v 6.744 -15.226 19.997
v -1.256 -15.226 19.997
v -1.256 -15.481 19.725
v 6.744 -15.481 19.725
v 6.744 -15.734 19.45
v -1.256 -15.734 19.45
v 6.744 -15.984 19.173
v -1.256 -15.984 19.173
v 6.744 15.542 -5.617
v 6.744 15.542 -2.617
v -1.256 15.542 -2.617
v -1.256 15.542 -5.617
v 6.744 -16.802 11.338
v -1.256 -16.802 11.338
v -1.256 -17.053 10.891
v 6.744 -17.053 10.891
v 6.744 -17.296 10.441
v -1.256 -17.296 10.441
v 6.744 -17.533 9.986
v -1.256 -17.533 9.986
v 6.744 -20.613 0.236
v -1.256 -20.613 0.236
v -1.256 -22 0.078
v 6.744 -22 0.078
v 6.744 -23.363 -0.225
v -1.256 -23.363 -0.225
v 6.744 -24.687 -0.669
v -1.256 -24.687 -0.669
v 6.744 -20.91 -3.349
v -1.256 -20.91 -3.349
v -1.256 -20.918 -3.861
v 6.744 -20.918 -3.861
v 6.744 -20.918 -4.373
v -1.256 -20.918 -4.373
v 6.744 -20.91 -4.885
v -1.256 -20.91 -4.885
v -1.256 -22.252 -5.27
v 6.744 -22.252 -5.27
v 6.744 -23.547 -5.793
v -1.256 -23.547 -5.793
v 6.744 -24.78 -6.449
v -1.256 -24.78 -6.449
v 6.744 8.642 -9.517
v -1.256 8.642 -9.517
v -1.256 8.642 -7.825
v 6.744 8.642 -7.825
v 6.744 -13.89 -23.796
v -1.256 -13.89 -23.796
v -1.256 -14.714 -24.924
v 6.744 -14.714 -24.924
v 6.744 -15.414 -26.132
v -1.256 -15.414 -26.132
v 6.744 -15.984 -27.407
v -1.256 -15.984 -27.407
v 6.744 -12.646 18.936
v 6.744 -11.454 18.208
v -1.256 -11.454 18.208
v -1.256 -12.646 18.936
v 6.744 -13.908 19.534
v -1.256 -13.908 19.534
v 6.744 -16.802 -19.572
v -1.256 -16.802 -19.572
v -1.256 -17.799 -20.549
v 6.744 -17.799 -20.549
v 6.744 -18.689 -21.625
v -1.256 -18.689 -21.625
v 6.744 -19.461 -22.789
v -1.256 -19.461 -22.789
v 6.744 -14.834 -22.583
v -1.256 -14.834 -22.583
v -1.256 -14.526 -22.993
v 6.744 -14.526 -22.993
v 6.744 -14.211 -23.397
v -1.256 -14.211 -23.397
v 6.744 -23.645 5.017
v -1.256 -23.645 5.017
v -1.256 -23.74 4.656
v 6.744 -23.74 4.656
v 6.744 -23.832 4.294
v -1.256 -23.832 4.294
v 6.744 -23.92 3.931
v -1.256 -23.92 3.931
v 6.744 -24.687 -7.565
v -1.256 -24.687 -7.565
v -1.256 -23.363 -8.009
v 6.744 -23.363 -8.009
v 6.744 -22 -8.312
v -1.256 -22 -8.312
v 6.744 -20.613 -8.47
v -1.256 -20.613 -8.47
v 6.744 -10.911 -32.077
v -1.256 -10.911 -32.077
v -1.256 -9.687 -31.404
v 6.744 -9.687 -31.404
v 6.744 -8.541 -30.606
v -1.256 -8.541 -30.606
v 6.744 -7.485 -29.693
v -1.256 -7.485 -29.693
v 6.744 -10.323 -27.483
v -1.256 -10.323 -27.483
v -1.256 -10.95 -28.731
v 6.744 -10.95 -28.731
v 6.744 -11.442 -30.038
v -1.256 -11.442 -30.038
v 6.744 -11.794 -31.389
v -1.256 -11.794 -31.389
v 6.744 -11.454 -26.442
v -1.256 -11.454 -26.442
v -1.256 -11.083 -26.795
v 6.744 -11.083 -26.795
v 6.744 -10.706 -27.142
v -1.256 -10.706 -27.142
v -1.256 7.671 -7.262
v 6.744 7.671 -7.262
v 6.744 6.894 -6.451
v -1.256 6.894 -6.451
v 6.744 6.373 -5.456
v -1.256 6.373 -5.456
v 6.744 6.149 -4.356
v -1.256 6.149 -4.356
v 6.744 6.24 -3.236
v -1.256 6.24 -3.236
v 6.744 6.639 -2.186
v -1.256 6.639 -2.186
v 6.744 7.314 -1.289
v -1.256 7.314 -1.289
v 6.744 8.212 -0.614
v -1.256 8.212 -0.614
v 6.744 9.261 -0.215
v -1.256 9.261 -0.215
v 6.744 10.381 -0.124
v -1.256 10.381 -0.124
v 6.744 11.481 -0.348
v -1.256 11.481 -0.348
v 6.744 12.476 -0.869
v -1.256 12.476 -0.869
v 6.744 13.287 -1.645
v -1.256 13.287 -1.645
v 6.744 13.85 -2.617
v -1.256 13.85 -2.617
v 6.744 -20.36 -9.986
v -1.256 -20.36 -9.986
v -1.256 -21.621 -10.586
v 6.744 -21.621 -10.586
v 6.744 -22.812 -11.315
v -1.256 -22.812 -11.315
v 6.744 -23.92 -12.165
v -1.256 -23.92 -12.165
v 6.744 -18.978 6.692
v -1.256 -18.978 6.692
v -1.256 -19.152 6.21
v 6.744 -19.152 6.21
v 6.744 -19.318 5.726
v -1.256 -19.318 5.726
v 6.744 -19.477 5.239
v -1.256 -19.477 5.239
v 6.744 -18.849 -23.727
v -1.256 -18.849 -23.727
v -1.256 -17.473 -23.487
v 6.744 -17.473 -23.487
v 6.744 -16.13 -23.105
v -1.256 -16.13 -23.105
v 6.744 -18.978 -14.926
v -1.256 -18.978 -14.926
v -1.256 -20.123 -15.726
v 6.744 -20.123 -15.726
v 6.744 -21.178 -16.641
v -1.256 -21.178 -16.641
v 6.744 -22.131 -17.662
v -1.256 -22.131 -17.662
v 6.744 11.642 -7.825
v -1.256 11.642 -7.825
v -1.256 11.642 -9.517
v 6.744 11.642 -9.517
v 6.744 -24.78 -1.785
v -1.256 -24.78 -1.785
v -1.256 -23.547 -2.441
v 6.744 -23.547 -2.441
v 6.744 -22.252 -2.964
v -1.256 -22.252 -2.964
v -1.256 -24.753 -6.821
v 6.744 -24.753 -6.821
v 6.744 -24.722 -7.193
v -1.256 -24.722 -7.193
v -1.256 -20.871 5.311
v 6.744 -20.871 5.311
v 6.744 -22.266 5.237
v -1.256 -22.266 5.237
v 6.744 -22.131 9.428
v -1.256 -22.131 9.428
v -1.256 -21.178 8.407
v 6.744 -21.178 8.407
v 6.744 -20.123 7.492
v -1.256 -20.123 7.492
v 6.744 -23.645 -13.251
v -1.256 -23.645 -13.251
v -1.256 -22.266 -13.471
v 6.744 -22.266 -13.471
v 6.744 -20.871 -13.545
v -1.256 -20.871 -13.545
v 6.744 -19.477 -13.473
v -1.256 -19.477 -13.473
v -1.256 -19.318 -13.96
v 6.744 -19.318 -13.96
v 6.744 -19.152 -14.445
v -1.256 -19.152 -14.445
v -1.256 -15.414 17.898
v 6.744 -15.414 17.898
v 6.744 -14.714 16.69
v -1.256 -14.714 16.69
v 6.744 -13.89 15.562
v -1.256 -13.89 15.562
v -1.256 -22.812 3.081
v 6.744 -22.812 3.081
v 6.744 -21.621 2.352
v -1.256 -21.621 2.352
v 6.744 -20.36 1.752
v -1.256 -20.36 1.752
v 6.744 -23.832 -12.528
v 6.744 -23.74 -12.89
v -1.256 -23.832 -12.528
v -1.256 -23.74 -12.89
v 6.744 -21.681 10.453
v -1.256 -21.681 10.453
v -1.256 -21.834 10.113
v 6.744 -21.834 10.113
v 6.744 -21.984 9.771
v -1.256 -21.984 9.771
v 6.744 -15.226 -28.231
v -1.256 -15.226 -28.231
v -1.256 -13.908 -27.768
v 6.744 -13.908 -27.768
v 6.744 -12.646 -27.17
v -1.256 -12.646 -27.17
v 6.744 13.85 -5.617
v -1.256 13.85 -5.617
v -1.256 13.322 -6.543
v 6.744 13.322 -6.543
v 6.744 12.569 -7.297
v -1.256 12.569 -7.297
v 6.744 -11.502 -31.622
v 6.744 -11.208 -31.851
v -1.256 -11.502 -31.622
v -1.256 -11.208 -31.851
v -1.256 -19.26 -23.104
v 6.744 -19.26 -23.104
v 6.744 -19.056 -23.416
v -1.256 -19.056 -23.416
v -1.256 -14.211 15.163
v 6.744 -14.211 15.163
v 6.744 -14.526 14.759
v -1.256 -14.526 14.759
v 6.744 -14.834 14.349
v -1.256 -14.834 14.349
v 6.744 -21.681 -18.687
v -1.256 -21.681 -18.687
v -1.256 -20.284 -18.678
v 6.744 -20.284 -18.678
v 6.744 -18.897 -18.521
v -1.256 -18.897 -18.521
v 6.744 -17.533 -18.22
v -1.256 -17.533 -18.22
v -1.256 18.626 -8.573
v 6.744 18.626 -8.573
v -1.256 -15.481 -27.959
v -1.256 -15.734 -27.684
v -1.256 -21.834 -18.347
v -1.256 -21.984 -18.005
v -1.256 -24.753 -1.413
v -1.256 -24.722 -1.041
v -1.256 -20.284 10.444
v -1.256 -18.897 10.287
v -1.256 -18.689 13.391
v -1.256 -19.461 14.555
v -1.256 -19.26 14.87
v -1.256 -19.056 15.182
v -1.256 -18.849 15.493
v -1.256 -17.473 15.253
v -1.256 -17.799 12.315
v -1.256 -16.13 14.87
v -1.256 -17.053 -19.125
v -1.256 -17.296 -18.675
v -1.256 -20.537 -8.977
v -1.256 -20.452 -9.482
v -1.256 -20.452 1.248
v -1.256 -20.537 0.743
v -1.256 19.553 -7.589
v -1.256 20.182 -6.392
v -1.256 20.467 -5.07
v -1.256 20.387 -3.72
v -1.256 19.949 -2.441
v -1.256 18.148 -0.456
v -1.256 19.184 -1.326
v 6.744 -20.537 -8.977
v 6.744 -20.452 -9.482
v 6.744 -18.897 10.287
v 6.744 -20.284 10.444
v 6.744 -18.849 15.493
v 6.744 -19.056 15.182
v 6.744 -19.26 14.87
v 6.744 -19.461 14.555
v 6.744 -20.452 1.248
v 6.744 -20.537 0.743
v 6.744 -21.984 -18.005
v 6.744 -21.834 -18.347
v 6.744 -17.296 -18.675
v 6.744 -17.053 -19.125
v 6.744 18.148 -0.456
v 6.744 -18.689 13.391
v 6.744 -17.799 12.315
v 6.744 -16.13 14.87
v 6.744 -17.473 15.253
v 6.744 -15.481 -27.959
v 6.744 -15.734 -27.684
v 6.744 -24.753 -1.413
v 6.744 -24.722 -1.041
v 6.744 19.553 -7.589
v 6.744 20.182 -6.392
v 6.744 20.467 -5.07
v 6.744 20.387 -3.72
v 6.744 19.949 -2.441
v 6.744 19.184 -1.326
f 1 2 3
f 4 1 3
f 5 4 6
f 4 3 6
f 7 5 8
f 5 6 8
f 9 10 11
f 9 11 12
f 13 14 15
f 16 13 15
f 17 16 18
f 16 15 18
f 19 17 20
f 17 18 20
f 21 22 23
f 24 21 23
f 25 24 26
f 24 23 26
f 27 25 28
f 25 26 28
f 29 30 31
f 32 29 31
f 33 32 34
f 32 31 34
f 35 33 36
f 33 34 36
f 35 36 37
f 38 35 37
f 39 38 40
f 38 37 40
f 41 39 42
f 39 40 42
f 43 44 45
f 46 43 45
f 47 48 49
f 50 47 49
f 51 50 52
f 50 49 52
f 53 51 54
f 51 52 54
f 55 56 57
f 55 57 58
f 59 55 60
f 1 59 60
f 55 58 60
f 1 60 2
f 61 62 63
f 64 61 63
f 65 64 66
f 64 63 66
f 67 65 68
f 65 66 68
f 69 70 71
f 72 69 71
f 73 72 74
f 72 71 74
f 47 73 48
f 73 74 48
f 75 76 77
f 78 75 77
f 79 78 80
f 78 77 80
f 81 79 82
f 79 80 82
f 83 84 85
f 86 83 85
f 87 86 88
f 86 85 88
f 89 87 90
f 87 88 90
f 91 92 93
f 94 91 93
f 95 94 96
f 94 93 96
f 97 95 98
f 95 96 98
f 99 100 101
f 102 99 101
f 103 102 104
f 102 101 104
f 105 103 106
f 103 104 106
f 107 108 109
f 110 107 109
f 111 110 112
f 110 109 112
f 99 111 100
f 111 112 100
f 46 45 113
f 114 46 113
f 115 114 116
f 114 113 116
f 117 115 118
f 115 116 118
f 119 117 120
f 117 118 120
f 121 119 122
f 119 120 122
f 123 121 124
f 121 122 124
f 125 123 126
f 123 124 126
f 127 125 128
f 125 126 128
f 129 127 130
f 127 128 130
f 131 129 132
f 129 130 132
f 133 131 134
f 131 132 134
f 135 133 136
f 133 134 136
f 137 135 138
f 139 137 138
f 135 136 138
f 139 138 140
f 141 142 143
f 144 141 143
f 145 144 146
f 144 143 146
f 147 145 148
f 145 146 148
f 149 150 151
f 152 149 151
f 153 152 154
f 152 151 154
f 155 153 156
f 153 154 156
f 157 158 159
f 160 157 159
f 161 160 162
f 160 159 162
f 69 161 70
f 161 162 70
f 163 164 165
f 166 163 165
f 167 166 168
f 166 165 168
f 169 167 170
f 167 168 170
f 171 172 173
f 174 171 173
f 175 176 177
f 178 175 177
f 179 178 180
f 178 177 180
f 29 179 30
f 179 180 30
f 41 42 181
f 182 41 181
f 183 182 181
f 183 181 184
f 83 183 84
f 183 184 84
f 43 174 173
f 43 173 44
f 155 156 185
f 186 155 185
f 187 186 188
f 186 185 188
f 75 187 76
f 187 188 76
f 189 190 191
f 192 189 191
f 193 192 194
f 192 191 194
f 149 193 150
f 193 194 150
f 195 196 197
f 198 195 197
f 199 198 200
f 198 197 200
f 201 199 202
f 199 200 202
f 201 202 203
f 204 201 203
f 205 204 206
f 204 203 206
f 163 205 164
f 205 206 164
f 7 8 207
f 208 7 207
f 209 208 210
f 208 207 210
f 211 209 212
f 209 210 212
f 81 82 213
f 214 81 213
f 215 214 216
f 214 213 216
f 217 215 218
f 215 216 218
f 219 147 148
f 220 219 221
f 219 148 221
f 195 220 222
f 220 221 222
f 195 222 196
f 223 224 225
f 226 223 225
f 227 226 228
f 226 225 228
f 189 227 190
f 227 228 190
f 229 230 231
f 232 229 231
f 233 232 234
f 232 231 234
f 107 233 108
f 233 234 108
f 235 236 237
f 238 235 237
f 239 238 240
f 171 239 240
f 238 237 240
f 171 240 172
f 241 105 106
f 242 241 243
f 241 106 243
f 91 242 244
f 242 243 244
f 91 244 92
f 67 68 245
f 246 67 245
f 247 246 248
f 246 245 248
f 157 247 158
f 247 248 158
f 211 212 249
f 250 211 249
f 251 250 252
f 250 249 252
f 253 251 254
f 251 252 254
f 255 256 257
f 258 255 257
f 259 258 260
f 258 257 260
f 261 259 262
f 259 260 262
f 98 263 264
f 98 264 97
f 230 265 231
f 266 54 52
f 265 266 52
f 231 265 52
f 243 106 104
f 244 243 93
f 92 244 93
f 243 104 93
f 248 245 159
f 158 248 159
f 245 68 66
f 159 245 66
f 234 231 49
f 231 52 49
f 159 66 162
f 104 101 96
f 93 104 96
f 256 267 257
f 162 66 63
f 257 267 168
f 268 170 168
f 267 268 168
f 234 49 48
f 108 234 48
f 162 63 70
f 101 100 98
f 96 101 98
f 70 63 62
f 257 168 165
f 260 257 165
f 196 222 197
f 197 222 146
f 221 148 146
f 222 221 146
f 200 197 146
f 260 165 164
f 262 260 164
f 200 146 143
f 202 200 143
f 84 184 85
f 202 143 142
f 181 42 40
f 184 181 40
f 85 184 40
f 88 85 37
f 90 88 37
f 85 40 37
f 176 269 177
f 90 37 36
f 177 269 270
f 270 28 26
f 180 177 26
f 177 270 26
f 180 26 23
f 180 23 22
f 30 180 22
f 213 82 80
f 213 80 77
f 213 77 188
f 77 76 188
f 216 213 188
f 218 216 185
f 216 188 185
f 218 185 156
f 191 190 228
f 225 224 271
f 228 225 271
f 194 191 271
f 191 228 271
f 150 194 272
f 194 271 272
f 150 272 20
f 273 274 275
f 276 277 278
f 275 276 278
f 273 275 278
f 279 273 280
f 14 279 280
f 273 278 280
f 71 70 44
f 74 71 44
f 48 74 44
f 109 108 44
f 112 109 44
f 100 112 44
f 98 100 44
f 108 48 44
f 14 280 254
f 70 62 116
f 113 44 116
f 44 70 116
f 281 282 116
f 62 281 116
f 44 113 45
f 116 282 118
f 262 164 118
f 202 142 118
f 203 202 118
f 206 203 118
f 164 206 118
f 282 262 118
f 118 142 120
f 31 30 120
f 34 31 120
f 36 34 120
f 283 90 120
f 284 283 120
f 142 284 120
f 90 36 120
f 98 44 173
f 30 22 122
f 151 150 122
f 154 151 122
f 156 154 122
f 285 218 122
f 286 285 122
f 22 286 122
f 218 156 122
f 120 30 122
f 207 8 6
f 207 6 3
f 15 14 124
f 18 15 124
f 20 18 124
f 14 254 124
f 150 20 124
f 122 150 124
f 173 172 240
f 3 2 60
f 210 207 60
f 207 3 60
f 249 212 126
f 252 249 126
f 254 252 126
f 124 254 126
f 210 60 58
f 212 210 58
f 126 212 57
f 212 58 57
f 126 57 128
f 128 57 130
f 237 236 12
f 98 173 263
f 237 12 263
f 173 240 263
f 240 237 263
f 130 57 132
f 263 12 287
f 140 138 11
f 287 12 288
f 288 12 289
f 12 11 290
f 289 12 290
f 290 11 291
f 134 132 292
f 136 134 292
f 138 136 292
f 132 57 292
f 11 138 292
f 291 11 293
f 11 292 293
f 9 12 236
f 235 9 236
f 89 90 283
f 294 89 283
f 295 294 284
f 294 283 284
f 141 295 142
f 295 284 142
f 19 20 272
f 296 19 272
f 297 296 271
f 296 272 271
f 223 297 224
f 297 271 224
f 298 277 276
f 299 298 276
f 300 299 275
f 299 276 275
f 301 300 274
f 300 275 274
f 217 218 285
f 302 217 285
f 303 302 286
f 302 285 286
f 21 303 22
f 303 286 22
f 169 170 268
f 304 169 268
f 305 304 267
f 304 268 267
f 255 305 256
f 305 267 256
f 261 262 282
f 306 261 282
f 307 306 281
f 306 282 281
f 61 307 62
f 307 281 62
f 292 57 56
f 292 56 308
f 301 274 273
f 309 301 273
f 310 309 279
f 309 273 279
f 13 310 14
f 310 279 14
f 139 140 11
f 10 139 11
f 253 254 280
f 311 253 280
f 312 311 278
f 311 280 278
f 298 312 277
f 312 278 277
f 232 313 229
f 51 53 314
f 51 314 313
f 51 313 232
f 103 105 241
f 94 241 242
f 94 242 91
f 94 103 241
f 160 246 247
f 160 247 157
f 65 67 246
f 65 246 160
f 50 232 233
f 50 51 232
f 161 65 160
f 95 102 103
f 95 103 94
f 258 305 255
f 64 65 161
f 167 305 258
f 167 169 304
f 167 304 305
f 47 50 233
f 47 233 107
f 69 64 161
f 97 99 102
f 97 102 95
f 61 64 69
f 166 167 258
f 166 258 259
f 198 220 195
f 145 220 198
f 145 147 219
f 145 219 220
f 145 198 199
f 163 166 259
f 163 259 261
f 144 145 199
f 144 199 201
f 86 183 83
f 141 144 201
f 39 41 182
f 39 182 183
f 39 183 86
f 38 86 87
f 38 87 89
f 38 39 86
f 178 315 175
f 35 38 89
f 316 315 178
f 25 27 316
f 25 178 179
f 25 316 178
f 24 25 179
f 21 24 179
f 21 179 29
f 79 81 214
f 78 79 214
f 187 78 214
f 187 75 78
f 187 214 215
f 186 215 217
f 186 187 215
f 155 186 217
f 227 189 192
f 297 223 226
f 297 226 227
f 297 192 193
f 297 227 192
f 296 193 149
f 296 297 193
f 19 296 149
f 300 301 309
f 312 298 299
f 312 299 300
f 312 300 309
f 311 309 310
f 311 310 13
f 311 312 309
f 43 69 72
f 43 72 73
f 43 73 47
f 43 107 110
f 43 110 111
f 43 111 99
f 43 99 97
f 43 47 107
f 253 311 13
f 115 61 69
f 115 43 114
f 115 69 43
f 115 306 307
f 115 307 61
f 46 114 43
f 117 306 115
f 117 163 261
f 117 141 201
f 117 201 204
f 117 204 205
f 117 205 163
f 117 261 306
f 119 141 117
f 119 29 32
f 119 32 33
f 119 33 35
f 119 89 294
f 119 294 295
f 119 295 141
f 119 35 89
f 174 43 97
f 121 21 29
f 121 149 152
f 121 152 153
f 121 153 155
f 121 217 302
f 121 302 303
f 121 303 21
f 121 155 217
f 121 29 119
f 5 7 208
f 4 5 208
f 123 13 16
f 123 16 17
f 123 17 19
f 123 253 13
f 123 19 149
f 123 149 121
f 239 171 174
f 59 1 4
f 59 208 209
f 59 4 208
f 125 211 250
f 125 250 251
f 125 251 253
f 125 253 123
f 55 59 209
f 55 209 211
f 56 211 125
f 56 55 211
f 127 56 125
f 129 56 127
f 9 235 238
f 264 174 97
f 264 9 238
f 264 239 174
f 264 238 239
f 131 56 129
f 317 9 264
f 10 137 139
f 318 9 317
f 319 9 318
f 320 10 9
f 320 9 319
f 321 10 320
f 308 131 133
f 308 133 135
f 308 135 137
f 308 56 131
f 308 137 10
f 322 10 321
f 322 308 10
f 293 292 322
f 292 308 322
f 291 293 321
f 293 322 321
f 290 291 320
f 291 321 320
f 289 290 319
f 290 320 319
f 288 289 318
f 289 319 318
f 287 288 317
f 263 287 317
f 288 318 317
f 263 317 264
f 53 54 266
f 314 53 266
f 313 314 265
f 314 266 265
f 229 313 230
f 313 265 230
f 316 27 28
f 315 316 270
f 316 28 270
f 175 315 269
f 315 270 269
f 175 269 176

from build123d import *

# Parameters (mm, degrees)
SPUR_START          = -1.255872891
SPUR_GEAR_ISO_DEPTH = 8
CUT_EXTRUDE1_START  = -8
CUT_EXTRUDE1_DEPTH  = 8
FILLET1_R           = 5


# Read off the part's stored shape, not the designer's step: spur gear_iso
with BuildPart() as part:
    # spur gear_iso outline → spur gear_iso (new body)
    with BuildSketch(Plane.YZ.offset(SPUR_START)):
        with BuildLine():
            ThreePointArc((10.70226618, 30.878475903), (10.142251627, 30.882956422), (9.582237074, 30.878475903))
            ThreePointArc((9.582237074, 30.878475903), (8.805580488, 28.934301135), (8.343630809, 26.892337993))
            ThreePointArc((8.343630809, 26.892337993), (7.577213288, 26.838365652), (6.812365147, 26.765453703))
            ThreePointArc((6.812365147, 26.765453703), (6.020619773, 28.703532711), (4.934555121, 30.493357996))
            ThreePointArc((4.934555121, 30.493357996), (4.381440967, 30.405602041), (3.829801752, 30.309007264))
            ThreePointArc((3.829801752, 30.309007264), (3.383738399, 28.263515034), (3.264185198, 26.17336719))
            ThreePointArc((3.264185198, 26.17336719), (2.517104168, 25.993982783), (1.774688472, 25.796175391))
            ThreePointArc((1.774688472, 25.796175391), (0.674744152, 27.577504522), (-0.691103553, 29.164158557))
            ThreePointArc((-0.691103553, 29.164158557), (-1.222229795, 28.986559882), (-1.750446392, 28.800485701))
            ThreePointArc((-1.750446392, 28.800485701), (-1.853749067, 26.709471704), (-1.62764469, 24.628152942))
            ThreePointArc((-1.62764469, 24.628152942), (-2.335010805, 24.328249608), (-3.034742893, 24.010942444))
            ThreePointArc((-3.034742893, 24.010942444), (-4.412882545, 25.586931683), (-6.021256538, 26.927134682))
            ThreePointArc((-6.021256538, 26.927134682), (-6.515907129, 26.664537715), (-7.006292737, 26.394059749))
            ThreePointArc((-7.006292737, 26.394059749), (-6.764016906, 24.314561396), (-6.198422489, 22.298844666))
            ThreePointArc((-6.198422489, 22.298844666), (-6.846778586, 21.886602987), (-7.484740198, 21.458451363))
            ThreePointArc((-7.484740198, 21.458451363), (-9.103483124, 22.786111831), (-10.910511155, 23.843306549))
            ThreePointArc((-10.910511155, 23.843306549), (-11.355193317, 23.502874251), (-11.794371494, 23.155370434))
            ThreePointArc((-11.794371494, 23.155370434), (-11.21312581, 21.144111019), (-10.323469295, 19.24897982))
            ThreePointArc((-10.323469295, 19.24897982), (-10.89512991, 18.735644674), (-11.453919115, 18.20832745))
            ThreePointArc((-11.453919115, 18.20832745), (-13.269110228, 19.251444031), (-15.225501284, 19.996792953))
            ThreePointArc((-15.225501284, 19.996792953), (-15.608085246, 19.587811429), (-15.984076358, 19.172760759))
            ThreePointArc((-15.984076358, 19.172760759), (-15.079715688, 17.284602196), (-13.890264584, 15.561750766))
            ThreePointArc((-13.890264584, 15.561750766), (-14.369636305, 14.961324598), (-14.834010792, 14.349225613))
            ThreePointArc((-14.834010792, 14.349225613), (-16.796136411, 15.079344806), (-18.848525243, 15.492516756))
            ThreePointArc((-18.848525243, 15.492516756), (-19.158575112, 15.026141957), (-19.461123099, 14.554865934))
            ThreePointArc((-19.461123099, 14.554865934), (-18.258316045, 12.841312267), (-16.801515479, 11.337735501))
            ThreePointArc((-16.801515479, 11.337735501), (-17.175522296, 10.666596371), (-17.532815138, 9.98641209))
            ThreePointArc((-17.532815138, 9.98641209), (-19.58835359, 10.383618147), (-21.680756382, 10.453342871))
            ThreePointArc((-21.680756382, 10.453342871), (-21.909814806, 9.942296285), (-22.130666949, 9.427650091))
            ThreePointArc((-22.130666949, 9.427650091), (-20.662222952, 7.935442597), (-18.977810645, 6.692154151))
            ThreePointArc((-18.977810645, 6.692154151), (-19.236250626, 5.968608985), (-19.476715807, 5.238893062))
            ThreePointArc((-19.476715807, 5.238893062), (-21.569597361, 5.292351237), (-23.644938818, 5.016726826))
            ThreePointArc((-23.644938818, 5.016726826), (-23.786757681, 4.474948472), (-23.919889709, 3.930970313))
            ThreePointArc((-23.919889709, 3.930970313), (-22.225864093, 2.700812522), (-20.359786422, 1.751726064))
            ThreePointArc((-20.359786422, 1.751726064), (-20.495609998, 0.995511288), (-20.612688254, 0.236168472))
            ThreePointArc((-20.612688254, 0.236168472), (-22.685824559, -0.055579435), (-24.687494776, -0.669034665))
            ThreePointArc((-24.687494776, -0.669034665), (-24.738205628, -1.226766486), (-24.779986047, -1.785238304))
            ThreePointArc((-24.779986047, -1.785238304), (-22.906587414, -2.719790893), (-20.909746114, -3.34878676))
            ThreePointArc((-20.909746114, -3.34878676), (-20.919248373, -4.117043577), (-20.909746114, -4.885300395))
            ThreePointArc((-20.909746114, -4.885300395), (-22.906587414, -5.514296262), (-24.779986047, -6.448848851))
            ThreePointArc((-24.779986047, -6.448848851), (-24.738205628, -7.007320669), (-24.687494776, -7.56505249))
            ThreePointArc((-24.687494776, -7.56505249), (-22.685824559, -8.17850772), (-20.612688254, -8.470255627))
            ThreePointArc((-20.612688254, -8.470255627), (-20.495609998, -9.229598443), (-20.359786422, -9.985813219))
            ThreePointArc((-20.359786422, -9.985813219), (-22.225864092, -10.934899678), (-23.919889709, -12.165057468))
            ThreePointArc((-23.919889709, -12.165057468), (-23.786757681, -12.709035628), (-23.644938818, -13.250813982))
            ThreePointArc((-23.644938818, -13.250813982), (-21.569597361, -13.526438392), (-19.476715807, -13.472980218))
            ThreePointArc((-19.476715807, -13.472980218), (-19.236250626, -14.20269614), (-18.977810645, -14.926241306))
            ThreePointArc((-18.977810645, -14.926241306), (-20.662222952, -16.169529752), (-22.130666949, -17.661737246))
            ThreePointArc((-22.130666949, -17.661737246), (-21.909814806, -18.17638344), (-21.680756382, -18.687430026))
            ThreePointArc((-21.680756382, -18.687430026), (-19.58835359, -18.617705303), (-17.532815138, -18.220499246))
            ThreePointArc((-17.532815138, -18.220499246), (-17.175522296, -18.900683526), (-16.801515479, -19.571822656))
            ThreePointArc((-16.801515479, -19.571822656), (-18.258316045, -21.075399422), (-19.461123099, -22.788953089))
            ThreePointArc((-19.461123099, -22.788953089), (-19.158575112, -23.260229112), (-18.848525243, -23.726603911))
            ThreePointArc((-18.848525243, -23.726603911), (-16.79613641, -23.313431962), (-14.834010792, -22.583312768))
            ThreePointArc((-14.834010792, -22.583312768), (-14.369636305, -23.195411753), (-13.890264584, -23.795837921))
            ThreePointArc((-13.890264584, -23.795837921), (-15.079715688, -25.518689351), (-15.984076358, -27.406847914))
            ThreePointArc((-15.984076358, -27.406847914), (-15.608085247, -27.821898584), (-15.225501284, -28.230880108))
            ThreePointArc((-15.225501284, -28.230880108), (-13.269110228, -27.485531187), (-11.453919115, -26.442414605))
            ThreePointArc((-11.453919115, -26.442414605), (-10.89512991, -26.969731829), (-10.323469295, -27.483066975))
            ThreePointArc((-10.323469295, -27.483066975), (-11.21312581, -29.378198174), (-11.794371494, -31.389457589))
            ThreePointArc((-11.794371494, -31.389457589), (-11.355193317, -31.736961407), (-10.910511155, -32.077393705))
            ThreePointArc((-10.910511155, -32.077393705), (-9.103483124, -31.020198987), (-7.484740198, -29.692538518))
            ThreePointArc((-7.484740198, -29.692538518), (-6.846778586, -30.120690142), (-6.198422489, -30.532931821))
            ThreePointArc((-6.198422489, -30.532931821), (-6.764016906, -32.548648551), (-7.006292737, -34.628146904))
            ThreePointArc((-7.006292737, -34.628146904), (-6.515907129, -34.89862487), (-6.021256538, -35.161221837))
            ThreePointArc((-6.021256538, -35.161221837), (-4.412882545, -33.821018838), (-3.034742893, -32.2450296))
            ThreePointArc((-3.034742893, -32.2450296), (-2.335010806, -32.562336764), (-1.62764469, -32.862240097))
            ThreePointArc((-1.62764469, -32.862240097), (-1.853749067, -34.943558859), (-1.750446392, -37.034572856))
            ThreePointArc((-1.750446392, -37.034572856), (-1.222229795, -37.220647037), (-0.691103553, -37.398245713))
            ThreePointArc((-0.691103553, -37.398245713), (0.674744152, -35.811591678), (1.774688472, -34.030262547))
            ThreePointArc((1.774688472, -34.030262547), (2.517104168, -34.228069938), (3.264185198, -34.407454345))
            ThreePointArc((3.264185198, -34.407454345), (3.383738399, -36.49760219), (3.829801752, -38.54309442))
            ThreePointArc((3.829801752, -38.54309442), (4.381440967, -38.639689197), (4.934555121, -38.727445151))
            ThreePointArc((4.934555121, -38.727445151), (6.020619773, -36.937619866), (6.812365147, -34.999540858))
            ThreePointArc((6.812365147, -34.999540858), (7.577213288, -35.072452807), (8.343630809, -35.126425148))
            ThreePointArc((8.343630809, -35.126425148), (8.805580488, -37.16838829), (9.582237074, -39.112563058))
            ThreePointArc((9.582237074, -39.112563058), (10.142251627, -39.117043578), (10.70226618, -39.112563058))
            ThreePointArc((10.70226618, -39.112563058), (11.478922766, -37.16838829), (11.940872445, -35.126425148))
            ThreePointArc((11.940872445, -35.126425148), (12.707289966, -35.072452807), (13.472138107, -34.999540858))
            ThreePointArc((13.472138107, -34.999540858), (14.263883482, -36.937619866), (15.349948133, -38.727445151))
            ThreePointArc((15.349948133, -38.727445151), (15.903062287, -38.639689197), (16.454701502, -38.54309442))
            ThreePointArc((16.454701502, -38.54309442), (16.900764855, -36.49760219), (17.020318056, -34.407454345))
            ThreePointArc((17.020318056, -34.407454345), (17.767399086, -34.228069938), (18.509814783, -34.030262547))
            ThreePointArc((18.509814783, -34.030262547), (19.609759102, -35.811591678), (20.975606807, -37.398245713))
            ThreePointArc((20.975606807, -37.398245713), (21.506733049, -37.220647037), (22.034949647, -37.034572856))
            ThreePointArc((22.034949647, -37.034572856), (22.138252321, -34.943558859), (21.912147944, -32.862240097))
            ThreePointArc((21.912147944, -32.862240097), (22.61951406, -32.562336764), (23.319246148, -32.2450296))
            ThreePointArc((23.319246148, -32.2450296), (24.697385799, -33.821018838), (26.305759792, -35.161221837))
            ThreePointArc((26.305759792, -35.161221837), (26.800410383, -34.89862487), (27.290795991, -34.628146904))
            ThreePointArc((27.290795991, -34.628146904), (27.04852016, -32.548648551), (26.482925743, -30.532931821))
            ThreePointArc((26.482925743, -30.532931821), (27.131281841, -30.120690142), (27.769243452, -29.692538518))
            ThreePointArc((27.769243452, -29.692538518), (29.387986378, -31.020198987), (31.19501441, -32.077393705))
            ThreePointArc((31.19501441, -32.077393705), (31.639696572, -31.736961407), (32.078874749, -31.389457589))
            ThreePointArc((32.078874749, -31.389457589), (31.497629065, -29.378198174), (30.607972549, -27.483066975))
            ThreePointArc((30.607972549, -27.483066975), (31.179633164, -26.969731829), (31.73842237, -26.442414605))
            ThreePointArc((31.73842237, -26.442414605), (33.553613483, -27.485531187), (35.510004539, -28.230880108))
            ThreePointArc((35.510004539, -28.230880108), (35.892588501, -27.821898585), (36.268579612, -27.406847914))
            ThreePointArc((36.268579612, -27.406847914), (35.364218942, -25.518689351), (34.174767838, -23.795837921))
            ThreePointArc((34.174767838, -23.795837921), (34.65413956, -23.195411753), (35.118514046, -22.583312768))
            ThreePointArc((35.118514046, -22.583312768), (37.080639664, -23.313431962), (39.133028497, -23.726603911))
            ThreePointArc((39.133028497, -23.726603911), (39.443078366, -23.260229112), (39.745626354, -22.788953089))
            ThreePointArc((39.745626354, -22.788953089), (38.5428193, -21.075399422), (37.086018733, -19.571822656))
            ThreePointArc((37.086018733, -19.571822656), (37.46002555, -18.900683526), (37.817318393, -18.220499246))
            ThreePointArc((37.817318393, -18.220499246), (39.872856845, -18.617705303), (41.965259636, -18.687430026))
            ThreePointArc((41.965259636, -18.687430026), (42.19431806, -18.17638344), (42.415170203, -17.661737246))
            ThreePointArc((42.415170203, -17.661737246), (40.946726206, -16.169529752), (39.262313899, -14.926241306))
            ThreePointArc((39.262313899, -14.926241306), (39.52075388, -14.20269614), (39.761219061, -13.472980218))
            ThreePointArc((39.761219061, -13.472980218), (41.854100616, -13.526438392), (43.929442073, -13.250813982))
            ThreePointArc((43.929442073, -13.250813982), (44.071260935, -12.709035628), (44.204392963, -12.165057468))
            ThreePointArc((44.204392963, -12.165057468), (42.510367346, -10.934899678), (40.644289676, -9.985813219))
            ThreePointArc((40.644289676, -9.985813219), (40.780113253, -9.229598444), (40.897191508, -8.470255627))
            ThreePointArc((40.897191508, -8.470255627), (42.970327813, -8.17850772), (44.971998031, -7.56505249))
            ThreePointArc((44.971998031, -7.56505249), (45.022708882, -7.007320669), (45.064489301, -6.448848851))
            ThreePointArc((45.064489301, -6.448848851), (43.191090668, -5.514296262), (41.194249368, -4.885300395))
            ThreePointArc((41.194249368, -4.885300395), (41.203751627, -4.117043577), (41.194249368, -3.34878676))
            ThreePointArc((41.194249368, -3.34878676), (43.191090668, -2.719790893), (45.064489301, -1.785238304))
            ThreePointArc((45.064489301, -1.785238304), (45.022708882, -1.226766486), (44.971998031, -0.669034665))
            ThreePointArc((44.971998031, -0.669034665), (42.970327813, -0.055579435), (40.897191508, 0.236168472))
            ThreePointArc((40.897191508, 0.236168472), (40.780113253, 0.995511288), (40.644289676, 1.751726064))
            ThreePointArc((40.644289676, 1.751726064), (42.510367347, 2.700812522), (44.204392963, 3.930970313))
            ThreePointArc((44.204392963, 3.930970313), (44.071260935, 4.474948472), (43.929442073, 5.016726826))
            ThreePointArc((43.929442073, 5.016726826), (41.854100616, 5.292351237), (39.761219061, 5.238893062))
            ThreePointArc((39.761219061, 5.238893062), (39.52075388, 5.968608985), (39.262313899, 6.692154151))
            ThreePointArc((39.262313899, 6.692154151), (40.946726206, 7.935442597), (42.415170203, 9.427650091))
            ThreePointArc((42.415170203, 9.427650091), (42.19431806, 9.942296285), (41.965259636, 10.453342871))
            ThreePointArc((41.965259636, 10.453342871), (39.872856845, 10.383618147), (37.817318393, 9.98641209))
            ThreePointArc((37.817318393, 9.98641209), (37.46002555, 10.666596371), (37.086018733, 11.337735501))
            ThreePointArc((37.086018733, 11.337735501), (38.5428193, 12.841312267), (39.745626354, 14.554865934))
            ThreePointArc((39.745626354, 14.554865934), (39.443078366, 15.026141957), (39.133028497, 15.492516756))
            ThreePointArc((39.133028497, 15.492516756), (37.080639665, 15.079344806), (35.118514046, 14.349225613))
            ThreePointArc((35.118514046, 14.349225613), (34.65413956, 14.961324598), (34.174767838, 15.561750766))
            ThreePointArc((34.174767838, 15.561750766), (35.364218942, 17.284602196), (36.268579612, 19.172760759))
            ThreePointArc((36.268579612, 19.172760759), (35.892588501, 19.587811429), (35.510004539, 19.996792953))
            ThreePointArc((35.510004539, 19.996792953), (33.553613483, 19.251444031), (31.73842237, 18.20832745))
            ThreePointArc((31.73842237, 18.20832745), (31.179633164, 18.735644674), (30.607972549, 19.24897982))
            ThreePointArc((30.607972549, 19.24897982), (31.497629065, 21.144111019), (32.078874749, 23.155370434))
            ThreePointArc((32.078874749, 23.155370434), (31.639696571, 23.502874251), (31.19501441, 23.843306549))
            ThreePointArc((31.19501441, 23.843306549), (29.387986378, 22.786111831), (27.769243452, 21.458451363))
            ThreePointArc((27.769243452, 21.458451363), (27.131281841, 21.886602987), (26.482925743, 22.298844666))
            ThreePointArc((26.482925743, 22.298844666), (27.04852016, 24.314561396), (27.290795991, 26.394059749))
            ThreePointArc((27.290795991, 26.394059749), (26.800410383, 26.664537715), (26.305759792, 26.927134682))
            ThreePointArc((26.305759792, 26.927134682), (24.697385799, 25.586931683), (23.319246148, 24.010942444))
            ThreePointArc((23.319246148, 24.010942444), (22.61951406, 24.328249608), (21.912147944, 24.628152942))
            ThreePointArc((21.912147944, 24.628152942), (22.138252321, 26.709471704), (22.034949647, 28.800485701))
            ThreePointArc((22.034949647, 28.800485701), (21.506733049, 28.986559882), (20.975606807, 29.164158557))
            ThreePointArc((20.975606807, 29.164158557), (19.609759102, 27.577504522), (18.509814783, 25.796175391))
            ThreePointArc((18.509814783, 25.796175391), (17.767399086, 25.993982783), (17.020318056, 26.17336719))
            ThreePointArc((17.020318056, 26.17336719), (16.900764855, 28.263515034), (16.454701502, 30.309007264))
            ThreePointArc((16.454701502, 30.309007264), (15.903062287, 30.405602041), (15.349948133, 30.493357996))
            ThreePointArc((15.349948133, 30.493357996), (14.263883482, 28.703532711), (13.472138107, 26.765453703))
            ThreePointArc((13.472138107, 26.765453703), (12.707289966, 26.838365652), (11.940872445, 26.892337993))
            ThreePointArc((11.940872445, 26.892337993), (11.478922766, 28.934301135), (10.70226618, 30.878475903))
        make_face()
        with BuildLine():
            Line((8.642251627, -9.517043578), (8.642251627, -7.825142821))
            ThreePointArc((8.642251627, -7.825142821), (7.313824503, -1.288616452), (13.850350871, -2.617043578))
            Line((13.850350871, -2.617043578), (15.542251627, -2.617043578))
            Line((15.542251627, -2.617043578), (15.542251627, -5.617043578))
            Line((15.542251627, -5.617043578), (13.850350871, -5.617043578))
            ThreePointArc((13.850350871, -5.617043578), (12.970678752, -6.945470702), (11.642251627, -7.825142821))
            Line((11.642251627, -7.825142821), (11.642251627, -9.517043578))
            Line((11.642251627, -9.517043578), (8.642251627, -9.517043578))
        make_face(mode=Mode.SUBTRACT)
    extrude(amount=SPUR_GEAR_ISO_DEPTH)

    # Sketch1 → Cut-Extrude1 (cut)
    with BuildSketch(Plane(origin=(6.744127109, 0, 0), x_dir=(0, 0, -1), z_dir=(1, 0, 0)).offset(CUT_EXTRUDE1_START)):
        with BuildLine():
            ThreePointArc((-19.24897982, -10.323469295), (-18.735644674, -10.89512991), (-18.20832745, -11.453919115))
            Line((-18.20832745, -11.453919115), (4.181405833, 24.055987178))
            Line((4.181405833, 24.055987178), (29.692538518, -7.484740198))
            ThreePointArc((29.692538518, -7.484740198), (30.120690142, -6.846778586), (30.532931821, -6.198422489))
            ThreePointArc((30.532931821, -6.198422489), (32.548648551, -6.764016906), (34.628146904, -7.006292737))
            ThreePointArc((34.628146904, -7.006292737), (34.89862487, -6.515907129), (35.161221837, -6.021256538))
            ThreePointArc((35.161221837, -6.021256538), (33.821018838, -4.412882545), (32.2450296, -3.034742893))
            ThreePointArc((32.2450296, -3.034742893), (32.562336764, -2.335010806), (32.862240097, -1.62764469))
            ThreePointArc((32.862240097, -1.62764469), (34.943558859, -1.853749067), (37.034572856, -1.750446392))
            ThreePointArc((37.034572856, -1.750446392), (37.220647037, -1.222229795), (37.398245713, -0.691103553))
            ThreePointArc((37.398245713, -0.691103553), (35.811591678, 0.674744152), (34.030262547, 1.774688472))
            ThreePointArc((34.030262547, 1.774688472), (34.228069938, 2.517104168), (34.407454345, 3.264185198))
            ThreePointArc((34.407454345, 3.264185198), (36.49760219, 3.383738399), (38.54309442, 3.829801752))
            ThreePointArc((38.54309442, 3.829801752), (38.639689197, 4.381440967), (38.727445151, 4.934555121))
            ThreePointArc((38.727445151, 4.934555121), (36.937619866, 6.020619773), (34.999540858, 6.812365147))
            ThreePointArc((34.999540858, 6.812365147), (35.072452807, 7.577213288), (35.126425148, 8.343630809))
            ThreePointArc((35.126425148, 8.343630809), (37.16838829, 8.805580488), (39.112563058, 9.582237074))
            ThreePointArc((39.112563058, 9.582237074), (39.117043578, 10.142251627), (39.112563058, 10.70226618))
            ThreePointArc((39.112563058, 10.70226618), (37.16838829, 11.478922766), (35.126425148, 11.940872445))
            ThreePointArc((35.126425148, 11.940872445), (35.072452807, 12.707289966), (34.999540858, 13.472138107))
            ThreePointArc((34.999540858, 13.472138107), (36.937619866, 14.263883482), (38.727445151, 15.349948133))
            ThreePointArc((38.727445151, 15.349948133), (38.639689197, 15.903062287), (38.54309442, 16.454701502))
            ThreePointArc((38.54309442, 16.454701502), (36.49760219, 16.900764855), (34.407454345, 17.020318056))
            ThreePointArc((34.407454345, 17.020318056), (34.228069938, 17.767399086), (34.030262547, 18.509814783))
            ThreePointArc((34.030262547, 18.509814783), (35.811591678, 19.609759102), (37.398245713, 20.975606807))
            ThreePointArc((37.398245713, 20.975606807), (37.220647037, 21.506733049), (37.034572856, 22.034949647))
            ThreePointArc((37.034572856, 22.034949647), (34.943558859, 22.138252321), (32.862240097, 21.912147944))
            ThreePointArc((32.862240097, 21.912147944), (32.562336764, 22.61951406), (32.2450296, 23.319246148))
            ThreePointArc((32.2450296, 23.319246148), (33.821018838, 24.697385799), (35.161221837, 26.305759792))
            ThreePointArc((35.161221837, 26.305759792), (34.89862487, 26.800410383), (34.628146904, 27.290795991))
            ThreePointArc((34.628146904, 27.290795991), (32.548648551, 27.04852016), (30.532931821, 26.482925743))
            ThreePointArc((30.532931821, 26.482925743), (30.120690142, 27.131281841), (29.692538518, 27.769243452))
            ThreePointArc((29.692538518, 27.769243452), (31.020198987, 29.387986378), (32.077393705, 31.19501441))
            ThreePointArc((32.077393705, 31.19501441), (31.736961407, 31.639696572), (31.389457589, 32.078874749))
            ThreePointArc((31.389457589, 32.078874749), (29.378198174, 31.497629065), (27.483066975, 30.607972549))
            ThreePointArc((27.483066975, 30.607972549), (26.969731829, 31.179633164), (26.442414605, 31.73842237))
            ThreePointArc((26.442414605, 31.73842237), (27.485531187, 33.553613483), (28.230880108, 35.510004539))
            ThreePointArc((28.230880108, 35.510004539), (27.821898585, 35.892588501), (27.406847914, 36.268579612))
            ThreePointArc((27.406847914, 36.268579612), (25.518689351, 35.364218942), (23.795837921, 34.174767838))
            ThreePointArc((23.795837921, 34.174767838), (23.195411753, 34.65413956), (22.583312768, 35.118514046))
            ThreePointArc((22.583312768, 35.118514046), (23.313431962, 37.080639664), (23.726603911, 39.133028497))
            ThreePointArc((23.726603911, 39.133028497), (23.260229112, 39.443078366), (22.788953089, 39.745626354))
            ThreePointArc((22.788953089, 39.745626354), (21.075399422, 38.5428193), (19.571822656, 37.086018733))
            ThreePointArc((19.571822656, 37.086018733), (18.900683526, 37.46002555), (18.220499246, 37.817318393))
            ThreePointArc((18.220499246, 37.817318393), (18.617705303, 39.872856845), (18.687430026, 41.965259636))
            ThreePointArc((18.687430026, 41.965259636), (18.17638344, 42.19431806), (17.661737246, 42.415170203))
            ThreePointArc((17.661737246, 42.415170203), (16.169529752, 40.946726206), (14.926241306, 39.262313899))
            ThreePointArc((14.926241306, 39.262313899), (14.20269614, 39.52075388), (13.472980218, 39.761219061))
            ThreePointArc((13.472980218, 39.761219061), (13.526438392, 41.854100616), (13.250813982, 43.929442073))
            ThreePointArc((13.250813982, 43.929442073), (12.709035628, 44.071260935), (12.165057468, 44.204392963))
            ThreePointArc((12.165057468, 44.204392963), (10.934899678, 42.510367346), (9.985813219, 40.644289676))
            ThreePointArc((9.985813219, 40.644289676), (9.229598444, 40.780113253), (8.470255627, 40.897191508))
            ThreePointArc((8.470255627, 40.897191508), (8.17850772, 42.970327813), (7.56505249, 44.971998031))
            ThreePointArc((7.56505249, 44.971998031), (7.007320669, 45.022708882), (6.448848851, 45.064489301))
            ThreePointArc((6.448848851, 45.064489301), (5.514296262, 43.191090668), (4.885300395, 41.194249368))
            ThreePointArc((4.885300395, 41.194249368), (4.117043577, 41.203751627), (3.34878676, 41.194249368))
            ThreePointArc((3.34878676, 41.194249368), (2.719790893, 43.191090668), (1.785238304, 45.064489301))
            ThreePointArc((1.785238304, 45.064489301), (1.226766486, 45.022708882), (0.669034665, 44.971998031))
            ThreePointArc((0.669034665, 44.971998031), (0.055579435, 42.970327813), (-0.236168472, 40.897191508))
            ThreePointArc((-0.236168472, 40.897191508), (-0.995511288, 40.780113253), (-1.751726064, 40.644289676))
            ThreePointArc((-1.751726064, 40.644289676), (-2.700812522, 42.510367347), (-3.930970313, 44.204392963))
            ThreePointArc((-3.930970313, 44.204392963), (-4.474948472, 44.071260935), (-5.016726826, 43.929442073))
            ThreePointArc((-5.016726826, 43.929442073), (-5.292351237, 41.854100616), (-5.238893062, 39.761219061))
            ThreePointArc((-5.238893062, 39.761219061), (-5.968608985, 39.52075388), (-6.692154151, 39.262313899))
            ThreePointArc((-6.692154151, 39.262313899), (-7.935442597, 40.946726206), (-9.427650091, 42.415170203))
            ThreePointArc((-9.427650091, 42.415170203), (-9.942296285, 42.19431806), (-10.453342871, 41.965259636))
            ThreePointArc((-10.453342871, 41.965259636), (-10.383618147, 39.872856845), (-9.98641209, 37.817318393))
            ThreePointArc((-9.98641209, 37.817318393), (-10.666596371, 37.46002555), (-11.337735501, 37.086018733))
            ThreePointArc((-11.337735501, 37.086018733), (-12.841312267, 38.5428193), (-14.554865934, 39.745626354))
            ThreePointArc((-14.554865934, 39.745626354), (-15.026141957, 39.443078366), (-15.492516756, 39.133028497))
            ThreePointArc((-15.492516756, 39.133028497), (-15.079344806, 37.080639665), (-14.349225613, 35.118514046))
            ThreePointArc((-14.349225613, 35.118514046), (-14.961324598, 34.65413956), (-15.561750766, 34.174767838))
            ThreePointArc((-15.561750766, 34.174767838), (-17.284602196, 35.364218942), (-19.172760759, 36.268579612))
            ThreePointArc((-19.172760759, 36.268579612), (-19.587811429, 35.892588501), (-19.996792953, 35.510004539))
            ThreePointArc((-19.996792953, 35.510004539), (-19.251444031, 33.553613483), (-18.20832745, 31.73842237))
            ThreePointArc((-18.20832745, 31.73842237), (-18.735644674, 31.179633164), (-19.24897982, 30.607972549))
            ThreePointArc((-19.24897982, 30.607972549), (-21.144111019, 31.497629065), (-23.155370434, 32.078874749))
            ThreePointArc((-23.155370434, 32.078874749), (-23.502874251, 31.639696571), (-23.843306549, 31.19501441))
            ThreePointArc((-23.843306549, 31.19501441), (-22.786111831, 29.387986378), (-21.458451363, 27.769243452))
            ThreePointArc((-21.458451363, 27.769243452), (-21.886602987, 27.131281841), (-22.298844666, 26.482925743))
            ThreePointArc((-22.298844666, 26.482925743), (-24.314561396, 27.04852016), (-26.394059749, 27.290795991))
            ThreePointArc((-26.394059749, 27.290795991), (-26.664537715, 26.800410383), (-26.927134682, 26.305759792))
            ThreePointArc((-26.927134682, 26.305759792), (-25.586931683, 24.697385799), (-24.010942444, 23.319246148))
            ThreePointArc((-24.010942444, 23.319246148), (-24.328249608, 22.61951406), (-24.628152942, 21.912147944))
            ThreePointArc((-24.628152942, 21.912147944), (-26.709471704, 22.138252321), (-28.800485701, 22.034949647))
            ThreePointArc((-28.800485701, 22.034949647), (-28.986559882, 21.506733049), (-29.164158557, 20.975606807))
            ThreePointArc((-29.164158557, 20.975606807), (-27.577504522, 19.609759102), (-25.796175391, 18.509814783))
            ThreePointArc((-25.796175391, 18.509814783), (-25.993982783, 17.767399086), (-26.17336719, 17.020318056))
            ThreePointArc((-26.17336719, 17.020318056), (-28.263515034, 16.900764855), (-30.309007264, 16.454701502))
            ThreePointArc((-30.309007264, 16.454701502), (-30.405602041, 15.903062287), (-30.493357996, 15.349948133))
            ThreePointArc((-30.493357996, 15.349948133), (-28.703532711, 14.263883482), (-26.765453703, 13.472138107))
            ThreePointArc((-26.765453703, 13.472138107), (-26.838365652, 12.707289966), (-26.892337993, 11.940872445))
            ThreePointArc((-26.892337993, 11.940872445), (-28.934301135, 11.478922766), (-30.878475903, 10.70226618))
            ThreePointArc((-30.878475903, 10.70226618), (-30.882956422, 10.142251627), (-30.878475903, 9.582237074))
            ThreePointArc((-30.878475903, 9.582237074), (-28.934301135, 8.805580488), (-26.892337993, 8.343630809))
            ThreePointArc((-26.892337993, 8.343630809), (-26.838365652, 7.577213288), (-26.765453703, 6.812365147))
            ThreePointArc((-26.765453703, 6.812365147), (-28.703532711, 6.020619773), (-30.493357996, 4.934555121))
            ThreePointArc((-30.493357996, 4.934555121), (-30.405602041, 4.381440967), (-30.309007264, 3.829801752))
            ThreePointArc((-30.309007264, 3.829801752), (-28.263515034, 3.383738399), (-26.17336719, 3.264185198))
            ThreePointArc((-26.17336719, 3.264185198), (-25.993982783, 2.517104168), (-25.796175391, 1.774688472))
            ThreePointArc((-25.796175391, 1.774688472), (-27.577504522, 0.674744152), (-29.164158557, -0.691103553))
            ThreePointArc((-29.164158557, -0.691103553), (-28.986559882, -1.222229795), (-28.800485701, -1.750446392))
            ThreePointArc((-28.800485701, -1.750446392), (-26.709471704, -1.853749067), (-24.628152942, -1.62764469))
            ThreePointArc((-24.628152942, -1.62764469), (-24.328249608, -2.335010805), (-24.010942444, -3.034742893))
            ThreePointArc((-24.010942444, -3.034742893), (-25.586931683, -4.412882545), (-26.927134682, -6.021256538))
            ThreePointArc((-26.927134682, -6.021256538), (-26.664537715, -6.515907129), (-26.394059749, -7.006292737))
            ThreePointArc((-26.394059749, -7.006292737), (-24.314561396, -6.764016906), (-22.298844666, -6.198422489))
            ThreePointArc((-22.298844666, -6.198422489), (-21.886602987, -6.846778586), (-21.458451363, -7.484740198))
            ThreePointArc((-21.458451363, -7.484740198), (-22.786111831, -9.103483124), (-23.843306549, -10.910511155))
            ThreePointArc((-23.843306549, -10.910511155), (-23.502874251, -11.355193317), (-23.155370434, -11.794371494))
            ThreePointArc((-23.155370434, -11.794371494), (-21.144111019, -11.21312581), (-19.24897982, -10.323469295))
        make_face()
    extrude(amount=CUT_EXTRUDE1_DEPTH, mode=Mode.SUBTRACT)

    # Fillet1
    fillet1_edges = [part.edges().sort_by_distance(p)[0] for p in [
        (2.744127109, 24.055987178, -4.181405833),
    ]]
    fillet(fillet1_edges, radius=FILLET1_R)


solid = part.part
